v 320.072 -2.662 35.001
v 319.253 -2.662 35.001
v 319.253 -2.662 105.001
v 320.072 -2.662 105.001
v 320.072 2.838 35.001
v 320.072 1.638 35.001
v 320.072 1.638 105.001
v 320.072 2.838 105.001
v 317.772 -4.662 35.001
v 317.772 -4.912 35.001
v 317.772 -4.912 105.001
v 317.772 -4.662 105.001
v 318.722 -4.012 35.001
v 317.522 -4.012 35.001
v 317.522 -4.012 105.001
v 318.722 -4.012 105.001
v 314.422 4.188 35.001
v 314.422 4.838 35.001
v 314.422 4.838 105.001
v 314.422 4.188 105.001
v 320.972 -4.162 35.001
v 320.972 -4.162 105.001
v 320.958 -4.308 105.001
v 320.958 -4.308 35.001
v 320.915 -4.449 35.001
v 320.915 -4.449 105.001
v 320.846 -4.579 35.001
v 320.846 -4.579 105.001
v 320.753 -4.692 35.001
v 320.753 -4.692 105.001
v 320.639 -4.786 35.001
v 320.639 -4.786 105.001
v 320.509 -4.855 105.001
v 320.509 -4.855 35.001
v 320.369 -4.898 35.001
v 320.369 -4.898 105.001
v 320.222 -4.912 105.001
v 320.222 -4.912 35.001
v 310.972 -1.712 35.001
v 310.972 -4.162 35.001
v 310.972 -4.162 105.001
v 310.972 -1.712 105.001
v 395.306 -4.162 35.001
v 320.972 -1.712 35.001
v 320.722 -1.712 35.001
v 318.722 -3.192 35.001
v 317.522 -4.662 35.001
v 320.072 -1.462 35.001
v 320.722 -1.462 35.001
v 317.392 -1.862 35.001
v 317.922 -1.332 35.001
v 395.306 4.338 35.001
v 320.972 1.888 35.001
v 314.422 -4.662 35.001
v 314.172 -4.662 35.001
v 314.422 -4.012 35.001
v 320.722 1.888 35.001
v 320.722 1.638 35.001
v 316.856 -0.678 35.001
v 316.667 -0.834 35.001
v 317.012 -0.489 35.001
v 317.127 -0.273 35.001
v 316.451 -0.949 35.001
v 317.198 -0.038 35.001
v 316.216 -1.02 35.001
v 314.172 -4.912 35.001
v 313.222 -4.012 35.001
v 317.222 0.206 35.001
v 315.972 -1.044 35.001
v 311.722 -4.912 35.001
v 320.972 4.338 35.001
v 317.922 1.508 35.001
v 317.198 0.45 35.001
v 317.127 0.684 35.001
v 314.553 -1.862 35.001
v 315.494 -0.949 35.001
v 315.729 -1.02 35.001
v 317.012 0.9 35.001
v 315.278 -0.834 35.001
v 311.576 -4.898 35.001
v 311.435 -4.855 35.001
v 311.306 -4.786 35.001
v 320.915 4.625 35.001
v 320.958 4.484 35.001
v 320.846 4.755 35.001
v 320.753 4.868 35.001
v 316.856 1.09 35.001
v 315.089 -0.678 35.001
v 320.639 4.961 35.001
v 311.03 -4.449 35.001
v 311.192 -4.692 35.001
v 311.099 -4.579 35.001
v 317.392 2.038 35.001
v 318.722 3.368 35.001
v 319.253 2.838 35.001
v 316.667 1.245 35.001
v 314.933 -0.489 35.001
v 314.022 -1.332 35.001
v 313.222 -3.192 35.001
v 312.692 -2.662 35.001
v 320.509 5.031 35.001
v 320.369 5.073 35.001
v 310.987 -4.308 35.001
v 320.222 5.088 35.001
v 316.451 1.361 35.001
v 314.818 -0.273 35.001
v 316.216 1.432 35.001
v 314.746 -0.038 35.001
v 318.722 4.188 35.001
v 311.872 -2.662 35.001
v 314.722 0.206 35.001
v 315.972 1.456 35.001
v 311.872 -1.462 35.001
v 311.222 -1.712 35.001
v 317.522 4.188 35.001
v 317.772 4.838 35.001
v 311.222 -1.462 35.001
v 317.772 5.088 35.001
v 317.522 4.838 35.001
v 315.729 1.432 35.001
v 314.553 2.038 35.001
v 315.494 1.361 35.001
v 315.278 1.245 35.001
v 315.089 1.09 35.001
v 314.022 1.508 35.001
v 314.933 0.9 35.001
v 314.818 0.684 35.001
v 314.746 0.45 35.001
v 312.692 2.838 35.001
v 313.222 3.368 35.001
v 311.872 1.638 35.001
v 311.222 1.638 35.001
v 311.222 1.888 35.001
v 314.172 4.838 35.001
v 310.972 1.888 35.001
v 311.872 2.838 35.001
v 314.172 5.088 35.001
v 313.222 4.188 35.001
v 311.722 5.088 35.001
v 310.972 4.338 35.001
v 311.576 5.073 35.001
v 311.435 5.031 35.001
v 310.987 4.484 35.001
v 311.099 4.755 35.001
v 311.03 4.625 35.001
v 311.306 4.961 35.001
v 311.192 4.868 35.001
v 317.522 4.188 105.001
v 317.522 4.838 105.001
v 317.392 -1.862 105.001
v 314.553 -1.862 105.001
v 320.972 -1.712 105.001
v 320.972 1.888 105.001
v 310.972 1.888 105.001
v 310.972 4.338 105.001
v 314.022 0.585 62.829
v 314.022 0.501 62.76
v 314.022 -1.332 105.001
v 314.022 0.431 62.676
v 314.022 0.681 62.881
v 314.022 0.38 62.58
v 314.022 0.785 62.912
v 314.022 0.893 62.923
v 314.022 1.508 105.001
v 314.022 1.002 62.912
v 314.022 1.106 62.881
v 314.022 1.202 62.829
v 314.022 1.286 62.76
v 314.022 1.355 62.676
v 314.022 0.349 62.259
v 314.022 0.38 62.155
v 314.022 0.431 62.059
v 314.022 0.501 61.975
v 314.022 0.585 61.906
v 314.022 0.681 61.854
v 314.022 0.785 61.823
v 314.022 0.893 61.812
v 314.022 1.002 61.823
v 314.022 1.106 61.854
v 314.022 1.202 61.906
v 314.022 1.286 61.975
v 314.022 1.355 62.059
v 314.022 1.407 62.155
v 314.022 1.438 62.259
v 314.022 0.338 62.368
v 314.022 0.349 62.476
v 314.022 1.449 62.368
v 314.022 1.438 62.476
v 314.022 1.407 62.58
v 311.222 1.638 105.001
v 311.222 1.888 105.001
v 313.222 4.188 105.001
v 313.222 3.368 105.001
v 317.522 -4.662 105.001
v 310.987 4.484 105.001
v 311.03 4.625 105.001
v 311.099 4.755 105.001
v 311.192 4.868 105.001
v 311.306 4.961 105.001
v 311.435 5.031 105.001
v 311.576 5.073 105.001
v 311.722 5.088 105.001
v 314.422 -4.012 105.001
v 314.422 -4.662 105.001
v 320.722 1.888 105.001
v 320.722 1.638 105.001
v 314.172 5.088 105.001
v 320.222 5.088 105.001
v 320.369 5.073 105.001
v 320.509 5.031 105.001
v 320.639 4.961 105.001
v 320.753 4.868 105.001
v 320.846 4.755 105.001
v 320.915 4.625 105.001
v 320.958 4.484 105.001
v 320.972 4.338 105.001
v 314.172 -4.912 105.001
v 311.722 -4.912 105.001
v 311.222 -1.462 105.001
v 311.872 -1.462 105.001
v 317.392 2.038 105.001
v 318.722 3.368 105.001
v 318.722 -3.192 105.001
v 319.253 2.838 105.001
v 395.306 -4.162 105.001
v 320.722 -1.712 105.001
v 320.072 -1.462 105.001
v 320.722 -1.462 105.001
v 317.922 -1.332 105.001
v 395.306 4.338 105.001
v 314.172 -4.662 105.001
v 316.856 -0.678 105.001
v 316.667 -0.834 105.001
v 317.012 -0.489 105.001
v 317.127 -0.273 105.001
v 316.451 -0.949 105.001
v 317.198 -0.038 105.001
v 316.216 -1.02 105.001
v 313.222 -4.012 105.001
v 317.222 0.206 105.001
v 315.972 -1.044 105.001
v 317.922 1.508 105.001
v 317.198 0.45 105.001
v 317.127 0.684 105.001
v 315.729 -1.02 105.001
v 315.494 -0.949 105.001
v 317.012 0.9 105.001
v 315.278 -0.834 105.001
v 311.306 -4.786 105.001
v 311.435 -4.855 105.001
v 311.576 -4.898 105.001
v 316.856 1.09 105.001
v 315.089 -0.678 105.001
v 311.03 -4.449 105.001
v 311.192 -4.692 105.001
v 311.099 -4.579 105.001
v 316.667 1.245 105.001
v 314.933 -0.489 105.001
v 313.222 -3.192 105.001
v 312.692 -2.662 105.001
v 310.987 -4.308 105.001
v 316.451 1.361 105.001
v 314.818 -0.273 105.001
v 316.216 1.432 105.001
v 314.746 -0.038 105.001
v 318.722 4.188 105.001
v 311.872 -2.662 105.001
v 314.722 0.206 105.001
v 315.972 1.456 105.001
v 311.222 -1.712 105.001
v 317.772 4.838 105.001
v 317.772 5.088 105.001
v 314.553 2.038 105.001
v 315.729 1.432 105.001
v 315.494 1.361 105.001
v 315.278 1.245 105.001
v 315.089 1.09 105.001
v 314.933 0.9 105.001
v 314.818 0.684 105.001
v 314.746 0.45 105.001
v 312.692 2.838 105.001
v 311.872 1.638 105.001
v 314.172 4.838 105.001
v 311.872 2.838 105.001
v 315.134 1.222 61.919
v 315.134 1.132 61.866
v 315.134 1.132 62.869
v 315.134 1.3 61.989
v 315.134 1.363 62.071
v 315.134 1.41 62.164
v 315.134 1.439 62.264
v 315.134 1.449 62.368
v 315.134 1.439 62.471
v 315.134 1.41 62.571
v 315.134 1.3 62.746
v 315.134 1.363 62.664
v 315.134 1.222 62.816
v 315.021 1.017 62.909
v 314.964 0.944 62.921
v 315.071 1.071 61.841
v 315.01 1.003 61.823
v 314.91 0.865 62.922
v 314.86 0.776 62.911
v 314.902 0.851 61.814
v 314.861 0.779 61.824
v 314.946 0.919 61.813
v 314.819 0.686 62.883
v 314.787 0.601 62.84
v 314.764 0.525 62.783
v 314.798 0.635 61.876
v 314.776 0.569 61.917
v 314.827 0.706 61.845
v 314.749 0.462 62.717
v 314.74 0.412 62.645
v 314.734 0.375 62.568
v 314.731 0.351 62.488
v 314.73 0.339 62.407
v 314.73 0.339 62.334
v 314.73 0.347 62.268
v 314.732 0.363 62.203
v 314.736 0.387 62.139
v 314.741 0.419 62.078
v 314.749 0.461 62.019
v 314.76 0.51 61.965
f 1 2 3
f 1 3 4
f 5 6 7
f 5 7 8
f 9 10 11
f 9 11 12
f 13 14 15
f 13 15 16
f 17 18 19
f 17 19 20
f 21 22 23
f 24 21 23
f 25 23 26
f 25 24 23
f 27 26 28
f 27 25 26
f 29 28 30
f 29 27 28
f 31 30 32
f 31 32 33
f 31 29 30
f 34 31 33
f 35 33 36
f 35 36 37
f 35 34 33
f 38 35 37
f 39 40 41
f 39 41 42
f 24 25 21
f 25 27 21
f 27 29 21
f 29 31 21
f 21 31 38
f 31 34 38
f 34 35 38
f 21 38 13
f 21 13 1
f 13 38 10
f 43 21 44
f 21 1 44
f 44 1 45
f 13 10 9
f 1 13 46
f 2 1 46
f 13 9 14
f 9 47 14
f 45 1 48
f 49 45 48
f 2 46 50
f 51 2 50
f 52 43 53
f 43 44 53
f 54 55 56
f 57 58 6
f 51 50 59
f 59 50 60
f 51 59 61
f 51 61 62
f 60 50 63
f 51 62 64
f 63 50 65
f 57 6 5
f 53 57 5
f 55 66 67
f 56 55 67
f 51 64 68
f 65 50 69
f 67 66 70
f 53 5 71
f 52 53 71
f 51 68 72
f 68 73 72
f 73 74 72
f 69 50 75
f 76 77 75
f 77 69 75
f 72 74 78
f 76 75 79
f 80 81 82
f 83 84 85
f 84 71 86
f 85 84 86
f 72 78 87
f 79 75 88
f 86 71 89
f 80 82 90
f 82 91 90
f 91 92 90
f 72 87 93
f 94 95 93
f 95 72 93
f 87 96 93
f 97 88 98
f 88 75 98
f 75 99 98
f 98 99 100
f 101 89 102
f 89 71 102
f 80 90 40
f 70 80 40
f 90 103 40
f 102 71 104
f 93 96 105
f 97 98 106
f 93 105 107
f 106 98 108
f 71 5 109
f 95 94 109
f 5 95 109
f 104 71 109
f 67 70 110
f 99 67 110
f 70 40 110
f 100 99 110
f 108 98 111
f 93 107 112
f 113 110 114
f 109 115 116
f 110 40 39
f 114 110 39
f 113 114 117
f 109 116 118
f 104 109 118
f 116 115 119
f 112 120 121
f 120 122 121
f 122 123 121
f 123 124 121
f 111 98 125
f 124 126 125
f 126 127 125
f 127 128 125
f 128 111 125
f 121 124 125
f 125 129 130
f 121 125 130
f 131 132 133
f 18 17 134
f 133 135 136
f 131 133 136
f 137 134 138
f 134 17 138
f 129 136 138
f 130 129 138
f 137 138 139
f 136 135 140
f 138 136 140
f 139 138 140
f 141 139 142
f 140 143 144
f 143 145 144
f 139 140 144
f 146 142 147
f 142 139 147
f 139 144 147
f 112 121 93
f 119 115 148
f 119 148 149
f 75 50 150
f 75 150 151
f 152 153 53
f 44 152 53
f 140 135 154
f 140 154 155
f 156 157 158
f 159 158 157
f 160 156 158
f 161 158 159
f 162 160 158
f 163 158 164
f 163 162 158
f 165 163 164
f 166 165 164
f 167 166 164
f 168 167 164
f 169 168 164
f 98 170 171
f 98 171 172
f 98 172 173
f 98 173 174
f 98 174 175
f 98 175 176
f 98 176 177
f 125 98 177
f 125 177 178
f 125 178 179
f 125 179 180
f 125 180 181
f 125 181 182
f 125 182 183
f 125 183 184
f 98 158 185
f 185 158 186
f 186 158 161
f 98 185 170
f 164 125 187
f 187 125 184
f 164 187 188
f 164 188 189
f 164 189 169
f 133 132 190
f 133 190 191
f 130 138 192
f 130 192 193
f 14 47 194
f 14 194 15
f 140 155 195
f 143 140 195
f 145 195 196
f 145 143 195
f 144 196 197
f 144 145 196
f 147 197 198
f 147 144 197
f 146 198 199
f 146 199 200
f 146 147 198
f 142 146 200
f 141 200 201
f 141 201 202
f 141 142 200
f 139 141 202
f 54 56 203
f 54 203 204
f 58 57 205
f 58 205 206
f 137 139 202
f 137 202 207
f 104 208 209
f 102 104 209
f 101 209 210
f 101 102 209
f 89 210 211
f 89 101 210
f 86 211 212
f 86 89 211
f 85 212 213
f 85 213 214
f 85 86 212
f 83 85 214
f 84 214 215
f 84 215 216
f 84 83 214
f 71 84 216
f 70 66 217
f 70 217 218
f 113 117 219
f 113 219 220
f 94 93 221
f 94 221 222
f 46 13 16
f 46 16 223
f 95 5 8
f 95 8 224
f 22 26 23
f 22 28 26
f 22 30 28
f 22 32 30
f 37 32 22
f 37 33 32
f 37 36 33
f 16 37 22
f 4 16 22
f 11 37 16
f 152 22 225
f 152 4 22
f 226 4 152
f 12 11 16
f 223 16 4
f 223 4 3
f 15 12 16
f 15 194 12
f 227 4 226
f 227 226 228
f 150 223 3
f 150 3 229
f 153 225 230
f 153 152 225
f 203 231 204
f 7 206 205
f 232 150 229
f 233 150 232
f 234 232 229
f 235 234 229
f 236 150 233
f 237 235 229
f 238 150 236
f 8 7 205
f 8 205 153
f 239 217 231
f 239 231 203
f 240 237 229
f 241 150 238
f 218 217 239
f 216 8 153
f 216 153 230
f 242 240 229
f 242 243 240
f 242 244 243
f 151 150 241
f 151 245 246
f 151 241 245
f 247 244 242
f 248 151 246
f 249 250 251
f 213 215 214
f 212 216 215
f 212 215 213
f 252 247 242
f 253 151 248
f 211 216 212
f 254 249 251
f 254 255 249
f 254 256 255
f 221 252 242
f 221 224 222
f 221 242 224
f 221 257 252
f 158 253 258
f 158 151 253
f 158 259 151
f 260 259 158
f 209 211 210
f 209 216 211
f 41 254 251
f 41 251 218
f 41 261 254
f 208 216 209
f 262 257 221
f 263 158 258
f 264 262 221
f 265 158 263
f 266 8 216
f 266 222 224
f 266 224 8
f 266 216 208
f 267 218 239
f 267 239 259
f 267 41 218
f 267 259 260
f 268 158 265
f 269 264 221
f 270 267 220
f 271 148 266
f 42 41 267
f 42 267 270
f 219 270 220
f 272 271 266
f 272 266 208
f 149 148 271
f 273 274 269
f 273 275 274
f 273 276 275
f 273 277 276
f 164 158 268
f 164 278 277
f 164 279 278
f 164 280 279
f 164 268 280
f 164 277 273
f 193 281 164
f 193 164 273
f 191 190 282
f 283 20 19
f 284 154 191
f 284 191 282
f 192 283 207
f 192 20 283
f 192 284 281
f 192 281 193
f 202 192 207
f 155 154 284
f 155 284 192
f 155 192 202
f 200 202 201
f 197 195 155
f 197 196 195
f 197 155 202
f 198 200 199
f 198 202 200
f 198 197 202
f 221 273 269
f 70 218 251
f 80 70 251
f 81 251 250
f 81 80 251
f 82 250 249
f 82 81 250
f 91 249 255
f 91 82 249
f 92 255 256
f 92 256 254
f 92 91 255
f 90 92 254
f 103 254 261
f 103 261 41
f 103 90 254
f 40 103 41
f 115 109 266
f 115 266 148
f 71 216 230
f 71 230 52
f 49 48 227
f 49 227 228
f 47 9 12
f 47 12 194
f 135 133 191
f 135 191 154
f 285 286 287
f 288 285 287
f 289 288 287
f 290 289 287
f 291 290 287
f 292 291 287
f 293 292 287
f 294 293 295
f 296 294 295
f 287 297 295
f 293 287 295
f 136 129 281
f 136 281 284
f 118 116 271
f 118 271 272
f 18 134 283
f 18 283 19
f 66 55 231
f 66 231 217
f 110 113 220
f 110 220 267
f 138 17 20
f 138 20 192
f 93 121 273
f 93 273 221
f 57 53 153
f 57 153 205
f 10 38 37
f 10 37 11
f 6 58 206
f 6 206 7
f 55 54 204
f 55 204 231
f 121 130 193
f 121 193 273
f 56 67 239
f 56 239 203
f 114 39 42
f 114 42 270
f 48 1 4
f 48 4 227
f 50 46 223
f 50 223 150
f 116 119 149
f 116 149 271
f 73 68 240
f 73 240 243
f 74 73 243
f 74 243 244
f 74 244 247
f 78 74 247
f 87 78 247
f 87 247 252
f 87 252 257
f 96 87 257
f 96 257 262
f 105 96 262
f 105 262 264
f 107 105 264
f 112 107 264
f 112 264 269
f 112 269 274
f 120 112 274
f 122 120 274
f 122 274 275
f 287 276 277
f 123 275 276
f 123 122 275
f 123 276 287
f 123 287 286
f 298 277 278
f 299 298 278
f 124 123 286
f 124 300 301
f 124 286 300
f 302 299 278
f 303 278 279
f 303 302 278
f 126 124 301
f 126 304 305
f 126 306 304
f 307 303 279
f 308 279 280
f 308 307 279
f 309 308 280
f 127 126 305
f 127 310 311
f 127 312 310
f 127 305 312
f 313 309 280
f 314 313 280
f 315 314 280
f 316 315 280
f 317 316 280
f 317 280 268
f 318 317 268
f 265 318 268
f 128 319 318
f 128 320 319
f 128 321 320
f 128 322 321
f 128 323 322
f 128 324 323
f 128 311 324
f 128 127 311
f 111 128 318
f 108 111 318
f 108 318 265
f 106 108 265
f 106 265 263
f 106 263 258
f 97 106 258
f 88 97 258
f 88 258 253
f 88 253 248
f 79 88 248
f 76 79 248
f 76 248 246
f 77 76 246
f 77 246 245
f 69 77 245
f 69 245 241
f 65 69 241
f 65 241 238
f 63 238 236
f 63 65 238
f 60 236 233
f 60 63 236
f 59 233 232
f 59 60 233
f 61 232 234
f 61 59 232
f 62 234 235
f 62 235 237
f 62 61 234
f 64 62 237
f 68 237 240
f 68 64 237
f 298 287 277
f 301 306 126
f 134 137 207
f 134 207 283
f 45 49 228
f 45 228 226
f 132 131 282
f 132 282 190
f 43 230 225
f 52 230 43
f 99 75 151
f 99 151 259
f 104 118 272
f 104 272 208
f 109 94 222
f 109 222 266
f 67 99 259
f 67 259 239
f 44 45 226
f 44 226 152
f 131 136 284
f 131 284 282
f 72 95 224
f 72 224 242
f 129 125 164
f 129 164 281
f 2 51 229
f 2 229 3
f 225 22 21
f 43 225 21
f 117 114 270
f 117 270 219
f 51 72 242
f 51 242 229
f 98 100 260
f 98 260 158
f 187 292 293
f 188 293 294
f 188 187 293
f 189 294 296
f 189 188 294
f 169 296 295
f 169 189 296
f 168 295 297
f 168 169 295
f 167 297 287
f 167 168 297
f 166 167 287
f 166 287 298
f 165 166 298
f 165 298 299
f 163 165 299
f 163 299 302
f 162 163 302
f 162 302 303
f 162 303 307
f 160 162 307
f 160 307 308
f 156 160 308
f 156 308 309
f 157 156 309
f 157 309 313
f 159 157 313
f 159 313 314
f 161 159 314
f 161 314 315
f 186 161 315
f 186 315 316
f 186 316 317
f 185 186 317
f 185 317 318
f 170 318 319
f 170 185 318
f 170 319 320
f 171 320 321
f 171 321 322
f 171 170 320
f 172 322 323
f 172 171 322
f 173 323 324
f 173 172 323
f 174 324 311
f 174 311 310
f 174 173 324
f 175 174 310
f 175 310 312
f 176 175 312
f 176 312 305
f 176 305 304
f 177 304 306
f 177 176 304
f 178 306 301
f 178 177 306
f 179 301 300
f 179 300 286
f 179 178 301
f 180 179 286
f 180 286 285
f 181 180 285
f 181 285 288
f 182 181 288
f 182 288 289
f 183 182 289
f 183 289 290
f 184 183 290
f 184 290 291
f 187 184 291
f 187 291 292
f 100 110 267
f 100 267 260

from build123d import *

# Parameters (mm, degrees)
SKETCH1_R           = 2.5
BOSS_EXTRUDE1_DEPTH = 140
SCALE_2_SCALE       = 3
SCALE_3_SCALE       = 6
SCALE_5_SCALE       = 2
SCALE_6_SCALE       = 0.25
SCALE_7_SCALE       = 0.125
SCALE_8_SCALE       = 0.25
SCALE_9_SCALE       = 4
SCALE_10_SCALE      = 4
OTHER_START         = -17.55
OTHER_1_OUTLINE_R   = 5
OTHER_1_DEPTH       = 10
SKETCH_11_W         = 630
SKETCH_11_H         = 76.5
EXTRUDE_1_DEPTH     = 669
SCALE_11_SCALE      = 0.111111111


# Read off the part's stored shape, not the designer's step: 孔1
with BuildPart() as part:
    # Sketch1 → Boss-Extrude1 (new body)
    with BuildSketch(Plane.XY):
        with BuildLine():
            Line((2.839339828, 3.9), (5.5, 6.560660172))
            Line((5.5, 6.560660172), (5.5, 8.2))
            Line((5.5, 8.2), (3.1, 8.2))
            Line((3.1, 8.2), (3.1, 9.5))
            Line((3.1, 9.5), (3.6, 9.5))
            Line((3.6, 9.5), (3.6, 10))
            Line((3.6, 10), (8.5, 10))
            ThreePointArc((8.5, 10), (9.560660172, 9.560660172), (10, 8.5))
            Line((10, 8.5), (10, 3.6))
            Line((10, 3.6), (9.5, 3.6))
            Line((9.5, 3.6), (9.5, 3.1))
            Line((9.5, 3.1), (8.2, 3.1))
            Line((8.2, 3.1), (8.2, 5.5))
            Line((8.2, 5.5), (6.560660172, 5.5))
            Line((6.560660172, 5.5), (3.9, 2.839339828))
            Line((3.9, 2.839339828), (3.9, -2.839339828))
            Line((3.9, -2.839339828), (6.560660172, -5.5))
            Line((6.560660172, -5.5), (8.2, -5.5))
            Line((8.2, -5.5), (8.2, -3.1))
            Line((8.2, -3.1), (9.5, -3.1))
            Line((9.5, -3.1), (9.5, -3.6))
            Line((9.5, -3.6), (10, -3.6))
            Line((10, -3.6), (10, -8.5))
            ThreePointArc((10, -8.5), (9.560660172, -9.560660172), (8.5, -10))
            Line((8.5, -10), (3.6, -10))
            Line((3.6, -10), (3.6, -9.5))
            Line((3.6, -9.5), (3.1, -9.5))
            Line((3.1, -9.5), (3.1, -8.2))
            Line((3.1, -8.2), (5.5, -8.2))
            Line((5.5, -8.2), (5.5, -6.560660172))
            Line((5.5, -6.560660172), (2.839339828, -3.9))
            Line((2.839339828, -3.9), (-2.839339828, -3.9))
            Line((-2.839339828, -3.9), (-5.5, -6.560660172))
            Line((-5.5, -6.560660172), (-5.5, -8.2))
            Line((-5.5, -8.2), (-3.1, -8.2))
            Line((-3.1, -8.2), (-3.1, -9.5))
            Line((-3.1, -9.5), (-3.6, -9.5))
            Line((-3.6, -9.5), (-3.6, -10))
            Line((-3.6, -10), (-8.5, -10))
            ThreePointArc((-8.5, -10), (-9.560660172, -9.560660172), (-10, -8.5))
            Line((-10, -8.5), (-10, -3.6))
            Line((-10, -3.6), (-9.5, -3.6))
            Line((-9.5, -3.6), (-9.5, -3.1))
            Line((-9.5, -3.1), (-8.2, -3.1))
            Line((-8.2, -3.1), (-8.2, -5.5))
            Line((-8.2, -5.5), (-6.560660172, -5.5))
            Line((-6.560660172, -5.5), (-3.9, -2.839339828))
            Line((-3.9, -2.839339828), (-3.9, 2.839339828))
            Line((-3.9, 2.839339828), (-6.560660172, 5.5))
            Line((-6.560660172, 5.5), (-8.2, 5.5))
            Line((-8.2, 5.5), (-8.2, 3.1))
            Line((-8.2, 3.1), (-9.5, 3.1))
            Line((-9.5, 3.1), (-9.5, 3.6))
            Line((-9.5, 3.6), (-10, 3.6))
            Line((-10, 3.6), (-10, 8.5))
            ThreePointArc((-10, 8.5), (-9.560660172, 9.560660172), (-8.5, 10))
            Line((-8.5, 10), (-3.6, 10))
            Line((-3.6, 10), (-3.6, 9.5))
            Line((-3.6, 9.5), (-3.1, 9.5))
            Line((-3.1, 9.5), (-3.1, 8.2))
            Line((-3.1, 8.2), (-5.5, 8.2))
            Line((-5.5, 8.2), (-5.5, 6.560660172))
            Line((-5.5, 6.560660172), (-2.839339828, 3.9))
            Line((-2.839339828, 3.9), (2.839339828, 3.9))
        make_face()
        with Locations((0, 0.235847297)):
            Circle(SKETCH1_R, mode=Mode.SUBTRACT)
    extrude(amount=BOSS_EXTRUDE1_DEPTH)


with BuildPart() as part_1:
    # 缩放比例2: scaled about (0, -0.027095247, 70)
    add(part.part.scale(SCALE_2_SCALE).moved(Location((0, 0.054190494, -140))))


with BuildPart() as part_2:
    # 缩放比例3: scaled about (0, -0.027095247, 70)
    add(part_1.part.scale(SCALE_3_SCALE).moved(Location((0, 0.135476235, -350))))


with BuildPart() as part_3:
    # 缩放比例5: scaled about (0, -0.027095249, 70)
    add(part_2.part.scale(SCALE_5_SCALE).moved(Location((0, 0.027095249, -70))))


with BuildPart() as part_4:
    # 缩放比例6: scaled about (0, -0.027095249, 70)
    add(part_3.part.scale(SCALE_6_SCALE).moved(Location((0, -0.020321437, 52.5))))


with BuildPart() as part_5:
    # 缩放比例7: scaled about (0, -0.027095249, 70)
    add(part_4.part.scale(SCALE_7_SCALE).moved(Location((0, -0.023708343, 61.25))))


with BuildPart() as part_6:
    # 缩放比例8: scaled about (0, -0.027095249, 70)
    add(part_5.part.scale(SCALE_8_SCALE).moved(Location((0, -0.020321437, 52.5))))


with BuildPart() as part_7:
    # 缩放比例9: scaled about (0, -0.027095249, 70)
    add(part_6.part.scale(SCALE_9_SCALE).moved(Location((0, 0.081285747, -210))))


with BuildPart() as part_8:
    # 缩放比例10: scaled about (0, -0.027095249, 70)
    add(part_7.part.scale(SCALE_10_SCALE).moved(Location((0, 0.081285747, -210))))

    # 孔1 outline → 孔1 (cut)
    with BuildSketch(Plane.YZ.offset(OTHER_START)):
        with Locations((7.344833538, 1.297306883)):
            Circle(OTHER_1_OUTLINE_R)
    extrude(amount=OTHER_1_DEPTH, mode=Mode.SUBTRACT)

    # 草图11 → 凸台-拉伸1 (add)
    with BuildSketch(Plane(origin=(45, 0, 0), x_dir=(0, 0, -1), z_dir=(1, 0, 0))):
        with Locations((-70, 0.094833365)):
            Rectangle(SKETCH_11_W, SKETCH_11_H)
    extrude(amount=EXTRUDE_1_DEPTH)


with BuildPart() as part_9:
    # 缩放比例11: scaled about (355.468990582, 0.086965488, 70.001302415)
    add(part_8.part.scale(SCALE_11_SCALE).moved(Location((315.972436073, 0.077302656, 62.223379924))))


solid = part_9.part
